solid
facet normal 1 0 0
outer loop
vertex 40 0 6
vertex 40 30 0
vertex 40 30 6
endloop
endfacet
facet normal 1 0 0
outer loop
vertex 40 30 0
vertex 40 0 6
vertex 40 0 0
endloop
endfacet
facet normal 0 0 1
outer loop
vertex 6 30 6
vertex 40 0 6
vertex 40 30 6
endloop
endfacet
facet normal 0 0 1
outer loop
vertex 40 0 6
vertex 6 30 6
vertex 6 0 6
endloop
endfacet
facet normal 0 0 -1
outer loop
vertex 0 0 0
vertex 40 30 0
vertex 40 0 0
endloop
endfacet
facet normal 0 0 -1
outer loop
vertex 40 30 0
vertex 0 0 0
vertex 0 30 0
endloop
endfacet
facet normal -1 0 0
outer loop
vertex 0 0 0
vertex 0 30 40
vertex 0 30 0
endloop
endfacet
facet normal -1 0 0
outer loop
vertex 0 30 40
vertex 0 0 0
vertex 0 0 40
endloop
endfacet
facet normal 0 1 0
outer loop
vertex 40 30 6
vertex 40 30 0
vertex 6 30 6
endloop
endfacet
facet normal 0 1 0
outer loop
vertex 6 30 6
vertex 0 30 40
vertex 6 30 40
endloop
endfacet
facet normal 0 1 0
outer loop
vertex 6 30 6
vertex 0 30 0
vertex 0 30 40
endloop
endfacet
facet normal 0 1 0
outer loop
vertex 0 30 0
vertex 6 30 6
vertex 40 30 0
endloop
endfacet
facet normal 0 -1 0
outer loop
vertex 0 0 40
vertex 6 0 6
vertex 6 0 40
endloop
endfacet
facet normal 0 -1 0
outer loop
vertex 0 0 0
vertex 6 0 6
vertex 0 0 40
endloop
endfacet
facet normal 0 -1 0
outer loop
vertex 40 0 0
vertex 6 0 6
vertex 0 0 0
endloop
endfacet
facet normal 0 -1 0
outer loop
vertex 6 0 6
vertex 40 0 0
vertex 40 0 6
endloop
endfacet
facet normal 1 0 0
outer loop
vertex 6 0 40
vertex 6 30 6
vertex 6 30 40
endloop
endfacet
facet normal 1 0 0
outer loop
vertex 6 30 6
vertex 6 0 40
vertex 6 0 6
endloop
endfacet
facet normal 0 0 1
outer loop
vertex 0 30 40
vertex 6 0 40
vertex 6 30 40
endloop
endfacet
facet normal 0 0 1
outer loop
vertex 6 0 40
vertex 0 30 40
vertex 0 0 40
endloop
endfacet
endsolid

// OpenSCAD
// An L bracket. All planar, one reflex crease, and the shape whose convex chain
// D11 turned out to be about.
FNSET = 0; $fn = FNSET;
R = 2;
union() {
    cube([40, 30, 6]);
    cube([6, 30, 40]);
}
